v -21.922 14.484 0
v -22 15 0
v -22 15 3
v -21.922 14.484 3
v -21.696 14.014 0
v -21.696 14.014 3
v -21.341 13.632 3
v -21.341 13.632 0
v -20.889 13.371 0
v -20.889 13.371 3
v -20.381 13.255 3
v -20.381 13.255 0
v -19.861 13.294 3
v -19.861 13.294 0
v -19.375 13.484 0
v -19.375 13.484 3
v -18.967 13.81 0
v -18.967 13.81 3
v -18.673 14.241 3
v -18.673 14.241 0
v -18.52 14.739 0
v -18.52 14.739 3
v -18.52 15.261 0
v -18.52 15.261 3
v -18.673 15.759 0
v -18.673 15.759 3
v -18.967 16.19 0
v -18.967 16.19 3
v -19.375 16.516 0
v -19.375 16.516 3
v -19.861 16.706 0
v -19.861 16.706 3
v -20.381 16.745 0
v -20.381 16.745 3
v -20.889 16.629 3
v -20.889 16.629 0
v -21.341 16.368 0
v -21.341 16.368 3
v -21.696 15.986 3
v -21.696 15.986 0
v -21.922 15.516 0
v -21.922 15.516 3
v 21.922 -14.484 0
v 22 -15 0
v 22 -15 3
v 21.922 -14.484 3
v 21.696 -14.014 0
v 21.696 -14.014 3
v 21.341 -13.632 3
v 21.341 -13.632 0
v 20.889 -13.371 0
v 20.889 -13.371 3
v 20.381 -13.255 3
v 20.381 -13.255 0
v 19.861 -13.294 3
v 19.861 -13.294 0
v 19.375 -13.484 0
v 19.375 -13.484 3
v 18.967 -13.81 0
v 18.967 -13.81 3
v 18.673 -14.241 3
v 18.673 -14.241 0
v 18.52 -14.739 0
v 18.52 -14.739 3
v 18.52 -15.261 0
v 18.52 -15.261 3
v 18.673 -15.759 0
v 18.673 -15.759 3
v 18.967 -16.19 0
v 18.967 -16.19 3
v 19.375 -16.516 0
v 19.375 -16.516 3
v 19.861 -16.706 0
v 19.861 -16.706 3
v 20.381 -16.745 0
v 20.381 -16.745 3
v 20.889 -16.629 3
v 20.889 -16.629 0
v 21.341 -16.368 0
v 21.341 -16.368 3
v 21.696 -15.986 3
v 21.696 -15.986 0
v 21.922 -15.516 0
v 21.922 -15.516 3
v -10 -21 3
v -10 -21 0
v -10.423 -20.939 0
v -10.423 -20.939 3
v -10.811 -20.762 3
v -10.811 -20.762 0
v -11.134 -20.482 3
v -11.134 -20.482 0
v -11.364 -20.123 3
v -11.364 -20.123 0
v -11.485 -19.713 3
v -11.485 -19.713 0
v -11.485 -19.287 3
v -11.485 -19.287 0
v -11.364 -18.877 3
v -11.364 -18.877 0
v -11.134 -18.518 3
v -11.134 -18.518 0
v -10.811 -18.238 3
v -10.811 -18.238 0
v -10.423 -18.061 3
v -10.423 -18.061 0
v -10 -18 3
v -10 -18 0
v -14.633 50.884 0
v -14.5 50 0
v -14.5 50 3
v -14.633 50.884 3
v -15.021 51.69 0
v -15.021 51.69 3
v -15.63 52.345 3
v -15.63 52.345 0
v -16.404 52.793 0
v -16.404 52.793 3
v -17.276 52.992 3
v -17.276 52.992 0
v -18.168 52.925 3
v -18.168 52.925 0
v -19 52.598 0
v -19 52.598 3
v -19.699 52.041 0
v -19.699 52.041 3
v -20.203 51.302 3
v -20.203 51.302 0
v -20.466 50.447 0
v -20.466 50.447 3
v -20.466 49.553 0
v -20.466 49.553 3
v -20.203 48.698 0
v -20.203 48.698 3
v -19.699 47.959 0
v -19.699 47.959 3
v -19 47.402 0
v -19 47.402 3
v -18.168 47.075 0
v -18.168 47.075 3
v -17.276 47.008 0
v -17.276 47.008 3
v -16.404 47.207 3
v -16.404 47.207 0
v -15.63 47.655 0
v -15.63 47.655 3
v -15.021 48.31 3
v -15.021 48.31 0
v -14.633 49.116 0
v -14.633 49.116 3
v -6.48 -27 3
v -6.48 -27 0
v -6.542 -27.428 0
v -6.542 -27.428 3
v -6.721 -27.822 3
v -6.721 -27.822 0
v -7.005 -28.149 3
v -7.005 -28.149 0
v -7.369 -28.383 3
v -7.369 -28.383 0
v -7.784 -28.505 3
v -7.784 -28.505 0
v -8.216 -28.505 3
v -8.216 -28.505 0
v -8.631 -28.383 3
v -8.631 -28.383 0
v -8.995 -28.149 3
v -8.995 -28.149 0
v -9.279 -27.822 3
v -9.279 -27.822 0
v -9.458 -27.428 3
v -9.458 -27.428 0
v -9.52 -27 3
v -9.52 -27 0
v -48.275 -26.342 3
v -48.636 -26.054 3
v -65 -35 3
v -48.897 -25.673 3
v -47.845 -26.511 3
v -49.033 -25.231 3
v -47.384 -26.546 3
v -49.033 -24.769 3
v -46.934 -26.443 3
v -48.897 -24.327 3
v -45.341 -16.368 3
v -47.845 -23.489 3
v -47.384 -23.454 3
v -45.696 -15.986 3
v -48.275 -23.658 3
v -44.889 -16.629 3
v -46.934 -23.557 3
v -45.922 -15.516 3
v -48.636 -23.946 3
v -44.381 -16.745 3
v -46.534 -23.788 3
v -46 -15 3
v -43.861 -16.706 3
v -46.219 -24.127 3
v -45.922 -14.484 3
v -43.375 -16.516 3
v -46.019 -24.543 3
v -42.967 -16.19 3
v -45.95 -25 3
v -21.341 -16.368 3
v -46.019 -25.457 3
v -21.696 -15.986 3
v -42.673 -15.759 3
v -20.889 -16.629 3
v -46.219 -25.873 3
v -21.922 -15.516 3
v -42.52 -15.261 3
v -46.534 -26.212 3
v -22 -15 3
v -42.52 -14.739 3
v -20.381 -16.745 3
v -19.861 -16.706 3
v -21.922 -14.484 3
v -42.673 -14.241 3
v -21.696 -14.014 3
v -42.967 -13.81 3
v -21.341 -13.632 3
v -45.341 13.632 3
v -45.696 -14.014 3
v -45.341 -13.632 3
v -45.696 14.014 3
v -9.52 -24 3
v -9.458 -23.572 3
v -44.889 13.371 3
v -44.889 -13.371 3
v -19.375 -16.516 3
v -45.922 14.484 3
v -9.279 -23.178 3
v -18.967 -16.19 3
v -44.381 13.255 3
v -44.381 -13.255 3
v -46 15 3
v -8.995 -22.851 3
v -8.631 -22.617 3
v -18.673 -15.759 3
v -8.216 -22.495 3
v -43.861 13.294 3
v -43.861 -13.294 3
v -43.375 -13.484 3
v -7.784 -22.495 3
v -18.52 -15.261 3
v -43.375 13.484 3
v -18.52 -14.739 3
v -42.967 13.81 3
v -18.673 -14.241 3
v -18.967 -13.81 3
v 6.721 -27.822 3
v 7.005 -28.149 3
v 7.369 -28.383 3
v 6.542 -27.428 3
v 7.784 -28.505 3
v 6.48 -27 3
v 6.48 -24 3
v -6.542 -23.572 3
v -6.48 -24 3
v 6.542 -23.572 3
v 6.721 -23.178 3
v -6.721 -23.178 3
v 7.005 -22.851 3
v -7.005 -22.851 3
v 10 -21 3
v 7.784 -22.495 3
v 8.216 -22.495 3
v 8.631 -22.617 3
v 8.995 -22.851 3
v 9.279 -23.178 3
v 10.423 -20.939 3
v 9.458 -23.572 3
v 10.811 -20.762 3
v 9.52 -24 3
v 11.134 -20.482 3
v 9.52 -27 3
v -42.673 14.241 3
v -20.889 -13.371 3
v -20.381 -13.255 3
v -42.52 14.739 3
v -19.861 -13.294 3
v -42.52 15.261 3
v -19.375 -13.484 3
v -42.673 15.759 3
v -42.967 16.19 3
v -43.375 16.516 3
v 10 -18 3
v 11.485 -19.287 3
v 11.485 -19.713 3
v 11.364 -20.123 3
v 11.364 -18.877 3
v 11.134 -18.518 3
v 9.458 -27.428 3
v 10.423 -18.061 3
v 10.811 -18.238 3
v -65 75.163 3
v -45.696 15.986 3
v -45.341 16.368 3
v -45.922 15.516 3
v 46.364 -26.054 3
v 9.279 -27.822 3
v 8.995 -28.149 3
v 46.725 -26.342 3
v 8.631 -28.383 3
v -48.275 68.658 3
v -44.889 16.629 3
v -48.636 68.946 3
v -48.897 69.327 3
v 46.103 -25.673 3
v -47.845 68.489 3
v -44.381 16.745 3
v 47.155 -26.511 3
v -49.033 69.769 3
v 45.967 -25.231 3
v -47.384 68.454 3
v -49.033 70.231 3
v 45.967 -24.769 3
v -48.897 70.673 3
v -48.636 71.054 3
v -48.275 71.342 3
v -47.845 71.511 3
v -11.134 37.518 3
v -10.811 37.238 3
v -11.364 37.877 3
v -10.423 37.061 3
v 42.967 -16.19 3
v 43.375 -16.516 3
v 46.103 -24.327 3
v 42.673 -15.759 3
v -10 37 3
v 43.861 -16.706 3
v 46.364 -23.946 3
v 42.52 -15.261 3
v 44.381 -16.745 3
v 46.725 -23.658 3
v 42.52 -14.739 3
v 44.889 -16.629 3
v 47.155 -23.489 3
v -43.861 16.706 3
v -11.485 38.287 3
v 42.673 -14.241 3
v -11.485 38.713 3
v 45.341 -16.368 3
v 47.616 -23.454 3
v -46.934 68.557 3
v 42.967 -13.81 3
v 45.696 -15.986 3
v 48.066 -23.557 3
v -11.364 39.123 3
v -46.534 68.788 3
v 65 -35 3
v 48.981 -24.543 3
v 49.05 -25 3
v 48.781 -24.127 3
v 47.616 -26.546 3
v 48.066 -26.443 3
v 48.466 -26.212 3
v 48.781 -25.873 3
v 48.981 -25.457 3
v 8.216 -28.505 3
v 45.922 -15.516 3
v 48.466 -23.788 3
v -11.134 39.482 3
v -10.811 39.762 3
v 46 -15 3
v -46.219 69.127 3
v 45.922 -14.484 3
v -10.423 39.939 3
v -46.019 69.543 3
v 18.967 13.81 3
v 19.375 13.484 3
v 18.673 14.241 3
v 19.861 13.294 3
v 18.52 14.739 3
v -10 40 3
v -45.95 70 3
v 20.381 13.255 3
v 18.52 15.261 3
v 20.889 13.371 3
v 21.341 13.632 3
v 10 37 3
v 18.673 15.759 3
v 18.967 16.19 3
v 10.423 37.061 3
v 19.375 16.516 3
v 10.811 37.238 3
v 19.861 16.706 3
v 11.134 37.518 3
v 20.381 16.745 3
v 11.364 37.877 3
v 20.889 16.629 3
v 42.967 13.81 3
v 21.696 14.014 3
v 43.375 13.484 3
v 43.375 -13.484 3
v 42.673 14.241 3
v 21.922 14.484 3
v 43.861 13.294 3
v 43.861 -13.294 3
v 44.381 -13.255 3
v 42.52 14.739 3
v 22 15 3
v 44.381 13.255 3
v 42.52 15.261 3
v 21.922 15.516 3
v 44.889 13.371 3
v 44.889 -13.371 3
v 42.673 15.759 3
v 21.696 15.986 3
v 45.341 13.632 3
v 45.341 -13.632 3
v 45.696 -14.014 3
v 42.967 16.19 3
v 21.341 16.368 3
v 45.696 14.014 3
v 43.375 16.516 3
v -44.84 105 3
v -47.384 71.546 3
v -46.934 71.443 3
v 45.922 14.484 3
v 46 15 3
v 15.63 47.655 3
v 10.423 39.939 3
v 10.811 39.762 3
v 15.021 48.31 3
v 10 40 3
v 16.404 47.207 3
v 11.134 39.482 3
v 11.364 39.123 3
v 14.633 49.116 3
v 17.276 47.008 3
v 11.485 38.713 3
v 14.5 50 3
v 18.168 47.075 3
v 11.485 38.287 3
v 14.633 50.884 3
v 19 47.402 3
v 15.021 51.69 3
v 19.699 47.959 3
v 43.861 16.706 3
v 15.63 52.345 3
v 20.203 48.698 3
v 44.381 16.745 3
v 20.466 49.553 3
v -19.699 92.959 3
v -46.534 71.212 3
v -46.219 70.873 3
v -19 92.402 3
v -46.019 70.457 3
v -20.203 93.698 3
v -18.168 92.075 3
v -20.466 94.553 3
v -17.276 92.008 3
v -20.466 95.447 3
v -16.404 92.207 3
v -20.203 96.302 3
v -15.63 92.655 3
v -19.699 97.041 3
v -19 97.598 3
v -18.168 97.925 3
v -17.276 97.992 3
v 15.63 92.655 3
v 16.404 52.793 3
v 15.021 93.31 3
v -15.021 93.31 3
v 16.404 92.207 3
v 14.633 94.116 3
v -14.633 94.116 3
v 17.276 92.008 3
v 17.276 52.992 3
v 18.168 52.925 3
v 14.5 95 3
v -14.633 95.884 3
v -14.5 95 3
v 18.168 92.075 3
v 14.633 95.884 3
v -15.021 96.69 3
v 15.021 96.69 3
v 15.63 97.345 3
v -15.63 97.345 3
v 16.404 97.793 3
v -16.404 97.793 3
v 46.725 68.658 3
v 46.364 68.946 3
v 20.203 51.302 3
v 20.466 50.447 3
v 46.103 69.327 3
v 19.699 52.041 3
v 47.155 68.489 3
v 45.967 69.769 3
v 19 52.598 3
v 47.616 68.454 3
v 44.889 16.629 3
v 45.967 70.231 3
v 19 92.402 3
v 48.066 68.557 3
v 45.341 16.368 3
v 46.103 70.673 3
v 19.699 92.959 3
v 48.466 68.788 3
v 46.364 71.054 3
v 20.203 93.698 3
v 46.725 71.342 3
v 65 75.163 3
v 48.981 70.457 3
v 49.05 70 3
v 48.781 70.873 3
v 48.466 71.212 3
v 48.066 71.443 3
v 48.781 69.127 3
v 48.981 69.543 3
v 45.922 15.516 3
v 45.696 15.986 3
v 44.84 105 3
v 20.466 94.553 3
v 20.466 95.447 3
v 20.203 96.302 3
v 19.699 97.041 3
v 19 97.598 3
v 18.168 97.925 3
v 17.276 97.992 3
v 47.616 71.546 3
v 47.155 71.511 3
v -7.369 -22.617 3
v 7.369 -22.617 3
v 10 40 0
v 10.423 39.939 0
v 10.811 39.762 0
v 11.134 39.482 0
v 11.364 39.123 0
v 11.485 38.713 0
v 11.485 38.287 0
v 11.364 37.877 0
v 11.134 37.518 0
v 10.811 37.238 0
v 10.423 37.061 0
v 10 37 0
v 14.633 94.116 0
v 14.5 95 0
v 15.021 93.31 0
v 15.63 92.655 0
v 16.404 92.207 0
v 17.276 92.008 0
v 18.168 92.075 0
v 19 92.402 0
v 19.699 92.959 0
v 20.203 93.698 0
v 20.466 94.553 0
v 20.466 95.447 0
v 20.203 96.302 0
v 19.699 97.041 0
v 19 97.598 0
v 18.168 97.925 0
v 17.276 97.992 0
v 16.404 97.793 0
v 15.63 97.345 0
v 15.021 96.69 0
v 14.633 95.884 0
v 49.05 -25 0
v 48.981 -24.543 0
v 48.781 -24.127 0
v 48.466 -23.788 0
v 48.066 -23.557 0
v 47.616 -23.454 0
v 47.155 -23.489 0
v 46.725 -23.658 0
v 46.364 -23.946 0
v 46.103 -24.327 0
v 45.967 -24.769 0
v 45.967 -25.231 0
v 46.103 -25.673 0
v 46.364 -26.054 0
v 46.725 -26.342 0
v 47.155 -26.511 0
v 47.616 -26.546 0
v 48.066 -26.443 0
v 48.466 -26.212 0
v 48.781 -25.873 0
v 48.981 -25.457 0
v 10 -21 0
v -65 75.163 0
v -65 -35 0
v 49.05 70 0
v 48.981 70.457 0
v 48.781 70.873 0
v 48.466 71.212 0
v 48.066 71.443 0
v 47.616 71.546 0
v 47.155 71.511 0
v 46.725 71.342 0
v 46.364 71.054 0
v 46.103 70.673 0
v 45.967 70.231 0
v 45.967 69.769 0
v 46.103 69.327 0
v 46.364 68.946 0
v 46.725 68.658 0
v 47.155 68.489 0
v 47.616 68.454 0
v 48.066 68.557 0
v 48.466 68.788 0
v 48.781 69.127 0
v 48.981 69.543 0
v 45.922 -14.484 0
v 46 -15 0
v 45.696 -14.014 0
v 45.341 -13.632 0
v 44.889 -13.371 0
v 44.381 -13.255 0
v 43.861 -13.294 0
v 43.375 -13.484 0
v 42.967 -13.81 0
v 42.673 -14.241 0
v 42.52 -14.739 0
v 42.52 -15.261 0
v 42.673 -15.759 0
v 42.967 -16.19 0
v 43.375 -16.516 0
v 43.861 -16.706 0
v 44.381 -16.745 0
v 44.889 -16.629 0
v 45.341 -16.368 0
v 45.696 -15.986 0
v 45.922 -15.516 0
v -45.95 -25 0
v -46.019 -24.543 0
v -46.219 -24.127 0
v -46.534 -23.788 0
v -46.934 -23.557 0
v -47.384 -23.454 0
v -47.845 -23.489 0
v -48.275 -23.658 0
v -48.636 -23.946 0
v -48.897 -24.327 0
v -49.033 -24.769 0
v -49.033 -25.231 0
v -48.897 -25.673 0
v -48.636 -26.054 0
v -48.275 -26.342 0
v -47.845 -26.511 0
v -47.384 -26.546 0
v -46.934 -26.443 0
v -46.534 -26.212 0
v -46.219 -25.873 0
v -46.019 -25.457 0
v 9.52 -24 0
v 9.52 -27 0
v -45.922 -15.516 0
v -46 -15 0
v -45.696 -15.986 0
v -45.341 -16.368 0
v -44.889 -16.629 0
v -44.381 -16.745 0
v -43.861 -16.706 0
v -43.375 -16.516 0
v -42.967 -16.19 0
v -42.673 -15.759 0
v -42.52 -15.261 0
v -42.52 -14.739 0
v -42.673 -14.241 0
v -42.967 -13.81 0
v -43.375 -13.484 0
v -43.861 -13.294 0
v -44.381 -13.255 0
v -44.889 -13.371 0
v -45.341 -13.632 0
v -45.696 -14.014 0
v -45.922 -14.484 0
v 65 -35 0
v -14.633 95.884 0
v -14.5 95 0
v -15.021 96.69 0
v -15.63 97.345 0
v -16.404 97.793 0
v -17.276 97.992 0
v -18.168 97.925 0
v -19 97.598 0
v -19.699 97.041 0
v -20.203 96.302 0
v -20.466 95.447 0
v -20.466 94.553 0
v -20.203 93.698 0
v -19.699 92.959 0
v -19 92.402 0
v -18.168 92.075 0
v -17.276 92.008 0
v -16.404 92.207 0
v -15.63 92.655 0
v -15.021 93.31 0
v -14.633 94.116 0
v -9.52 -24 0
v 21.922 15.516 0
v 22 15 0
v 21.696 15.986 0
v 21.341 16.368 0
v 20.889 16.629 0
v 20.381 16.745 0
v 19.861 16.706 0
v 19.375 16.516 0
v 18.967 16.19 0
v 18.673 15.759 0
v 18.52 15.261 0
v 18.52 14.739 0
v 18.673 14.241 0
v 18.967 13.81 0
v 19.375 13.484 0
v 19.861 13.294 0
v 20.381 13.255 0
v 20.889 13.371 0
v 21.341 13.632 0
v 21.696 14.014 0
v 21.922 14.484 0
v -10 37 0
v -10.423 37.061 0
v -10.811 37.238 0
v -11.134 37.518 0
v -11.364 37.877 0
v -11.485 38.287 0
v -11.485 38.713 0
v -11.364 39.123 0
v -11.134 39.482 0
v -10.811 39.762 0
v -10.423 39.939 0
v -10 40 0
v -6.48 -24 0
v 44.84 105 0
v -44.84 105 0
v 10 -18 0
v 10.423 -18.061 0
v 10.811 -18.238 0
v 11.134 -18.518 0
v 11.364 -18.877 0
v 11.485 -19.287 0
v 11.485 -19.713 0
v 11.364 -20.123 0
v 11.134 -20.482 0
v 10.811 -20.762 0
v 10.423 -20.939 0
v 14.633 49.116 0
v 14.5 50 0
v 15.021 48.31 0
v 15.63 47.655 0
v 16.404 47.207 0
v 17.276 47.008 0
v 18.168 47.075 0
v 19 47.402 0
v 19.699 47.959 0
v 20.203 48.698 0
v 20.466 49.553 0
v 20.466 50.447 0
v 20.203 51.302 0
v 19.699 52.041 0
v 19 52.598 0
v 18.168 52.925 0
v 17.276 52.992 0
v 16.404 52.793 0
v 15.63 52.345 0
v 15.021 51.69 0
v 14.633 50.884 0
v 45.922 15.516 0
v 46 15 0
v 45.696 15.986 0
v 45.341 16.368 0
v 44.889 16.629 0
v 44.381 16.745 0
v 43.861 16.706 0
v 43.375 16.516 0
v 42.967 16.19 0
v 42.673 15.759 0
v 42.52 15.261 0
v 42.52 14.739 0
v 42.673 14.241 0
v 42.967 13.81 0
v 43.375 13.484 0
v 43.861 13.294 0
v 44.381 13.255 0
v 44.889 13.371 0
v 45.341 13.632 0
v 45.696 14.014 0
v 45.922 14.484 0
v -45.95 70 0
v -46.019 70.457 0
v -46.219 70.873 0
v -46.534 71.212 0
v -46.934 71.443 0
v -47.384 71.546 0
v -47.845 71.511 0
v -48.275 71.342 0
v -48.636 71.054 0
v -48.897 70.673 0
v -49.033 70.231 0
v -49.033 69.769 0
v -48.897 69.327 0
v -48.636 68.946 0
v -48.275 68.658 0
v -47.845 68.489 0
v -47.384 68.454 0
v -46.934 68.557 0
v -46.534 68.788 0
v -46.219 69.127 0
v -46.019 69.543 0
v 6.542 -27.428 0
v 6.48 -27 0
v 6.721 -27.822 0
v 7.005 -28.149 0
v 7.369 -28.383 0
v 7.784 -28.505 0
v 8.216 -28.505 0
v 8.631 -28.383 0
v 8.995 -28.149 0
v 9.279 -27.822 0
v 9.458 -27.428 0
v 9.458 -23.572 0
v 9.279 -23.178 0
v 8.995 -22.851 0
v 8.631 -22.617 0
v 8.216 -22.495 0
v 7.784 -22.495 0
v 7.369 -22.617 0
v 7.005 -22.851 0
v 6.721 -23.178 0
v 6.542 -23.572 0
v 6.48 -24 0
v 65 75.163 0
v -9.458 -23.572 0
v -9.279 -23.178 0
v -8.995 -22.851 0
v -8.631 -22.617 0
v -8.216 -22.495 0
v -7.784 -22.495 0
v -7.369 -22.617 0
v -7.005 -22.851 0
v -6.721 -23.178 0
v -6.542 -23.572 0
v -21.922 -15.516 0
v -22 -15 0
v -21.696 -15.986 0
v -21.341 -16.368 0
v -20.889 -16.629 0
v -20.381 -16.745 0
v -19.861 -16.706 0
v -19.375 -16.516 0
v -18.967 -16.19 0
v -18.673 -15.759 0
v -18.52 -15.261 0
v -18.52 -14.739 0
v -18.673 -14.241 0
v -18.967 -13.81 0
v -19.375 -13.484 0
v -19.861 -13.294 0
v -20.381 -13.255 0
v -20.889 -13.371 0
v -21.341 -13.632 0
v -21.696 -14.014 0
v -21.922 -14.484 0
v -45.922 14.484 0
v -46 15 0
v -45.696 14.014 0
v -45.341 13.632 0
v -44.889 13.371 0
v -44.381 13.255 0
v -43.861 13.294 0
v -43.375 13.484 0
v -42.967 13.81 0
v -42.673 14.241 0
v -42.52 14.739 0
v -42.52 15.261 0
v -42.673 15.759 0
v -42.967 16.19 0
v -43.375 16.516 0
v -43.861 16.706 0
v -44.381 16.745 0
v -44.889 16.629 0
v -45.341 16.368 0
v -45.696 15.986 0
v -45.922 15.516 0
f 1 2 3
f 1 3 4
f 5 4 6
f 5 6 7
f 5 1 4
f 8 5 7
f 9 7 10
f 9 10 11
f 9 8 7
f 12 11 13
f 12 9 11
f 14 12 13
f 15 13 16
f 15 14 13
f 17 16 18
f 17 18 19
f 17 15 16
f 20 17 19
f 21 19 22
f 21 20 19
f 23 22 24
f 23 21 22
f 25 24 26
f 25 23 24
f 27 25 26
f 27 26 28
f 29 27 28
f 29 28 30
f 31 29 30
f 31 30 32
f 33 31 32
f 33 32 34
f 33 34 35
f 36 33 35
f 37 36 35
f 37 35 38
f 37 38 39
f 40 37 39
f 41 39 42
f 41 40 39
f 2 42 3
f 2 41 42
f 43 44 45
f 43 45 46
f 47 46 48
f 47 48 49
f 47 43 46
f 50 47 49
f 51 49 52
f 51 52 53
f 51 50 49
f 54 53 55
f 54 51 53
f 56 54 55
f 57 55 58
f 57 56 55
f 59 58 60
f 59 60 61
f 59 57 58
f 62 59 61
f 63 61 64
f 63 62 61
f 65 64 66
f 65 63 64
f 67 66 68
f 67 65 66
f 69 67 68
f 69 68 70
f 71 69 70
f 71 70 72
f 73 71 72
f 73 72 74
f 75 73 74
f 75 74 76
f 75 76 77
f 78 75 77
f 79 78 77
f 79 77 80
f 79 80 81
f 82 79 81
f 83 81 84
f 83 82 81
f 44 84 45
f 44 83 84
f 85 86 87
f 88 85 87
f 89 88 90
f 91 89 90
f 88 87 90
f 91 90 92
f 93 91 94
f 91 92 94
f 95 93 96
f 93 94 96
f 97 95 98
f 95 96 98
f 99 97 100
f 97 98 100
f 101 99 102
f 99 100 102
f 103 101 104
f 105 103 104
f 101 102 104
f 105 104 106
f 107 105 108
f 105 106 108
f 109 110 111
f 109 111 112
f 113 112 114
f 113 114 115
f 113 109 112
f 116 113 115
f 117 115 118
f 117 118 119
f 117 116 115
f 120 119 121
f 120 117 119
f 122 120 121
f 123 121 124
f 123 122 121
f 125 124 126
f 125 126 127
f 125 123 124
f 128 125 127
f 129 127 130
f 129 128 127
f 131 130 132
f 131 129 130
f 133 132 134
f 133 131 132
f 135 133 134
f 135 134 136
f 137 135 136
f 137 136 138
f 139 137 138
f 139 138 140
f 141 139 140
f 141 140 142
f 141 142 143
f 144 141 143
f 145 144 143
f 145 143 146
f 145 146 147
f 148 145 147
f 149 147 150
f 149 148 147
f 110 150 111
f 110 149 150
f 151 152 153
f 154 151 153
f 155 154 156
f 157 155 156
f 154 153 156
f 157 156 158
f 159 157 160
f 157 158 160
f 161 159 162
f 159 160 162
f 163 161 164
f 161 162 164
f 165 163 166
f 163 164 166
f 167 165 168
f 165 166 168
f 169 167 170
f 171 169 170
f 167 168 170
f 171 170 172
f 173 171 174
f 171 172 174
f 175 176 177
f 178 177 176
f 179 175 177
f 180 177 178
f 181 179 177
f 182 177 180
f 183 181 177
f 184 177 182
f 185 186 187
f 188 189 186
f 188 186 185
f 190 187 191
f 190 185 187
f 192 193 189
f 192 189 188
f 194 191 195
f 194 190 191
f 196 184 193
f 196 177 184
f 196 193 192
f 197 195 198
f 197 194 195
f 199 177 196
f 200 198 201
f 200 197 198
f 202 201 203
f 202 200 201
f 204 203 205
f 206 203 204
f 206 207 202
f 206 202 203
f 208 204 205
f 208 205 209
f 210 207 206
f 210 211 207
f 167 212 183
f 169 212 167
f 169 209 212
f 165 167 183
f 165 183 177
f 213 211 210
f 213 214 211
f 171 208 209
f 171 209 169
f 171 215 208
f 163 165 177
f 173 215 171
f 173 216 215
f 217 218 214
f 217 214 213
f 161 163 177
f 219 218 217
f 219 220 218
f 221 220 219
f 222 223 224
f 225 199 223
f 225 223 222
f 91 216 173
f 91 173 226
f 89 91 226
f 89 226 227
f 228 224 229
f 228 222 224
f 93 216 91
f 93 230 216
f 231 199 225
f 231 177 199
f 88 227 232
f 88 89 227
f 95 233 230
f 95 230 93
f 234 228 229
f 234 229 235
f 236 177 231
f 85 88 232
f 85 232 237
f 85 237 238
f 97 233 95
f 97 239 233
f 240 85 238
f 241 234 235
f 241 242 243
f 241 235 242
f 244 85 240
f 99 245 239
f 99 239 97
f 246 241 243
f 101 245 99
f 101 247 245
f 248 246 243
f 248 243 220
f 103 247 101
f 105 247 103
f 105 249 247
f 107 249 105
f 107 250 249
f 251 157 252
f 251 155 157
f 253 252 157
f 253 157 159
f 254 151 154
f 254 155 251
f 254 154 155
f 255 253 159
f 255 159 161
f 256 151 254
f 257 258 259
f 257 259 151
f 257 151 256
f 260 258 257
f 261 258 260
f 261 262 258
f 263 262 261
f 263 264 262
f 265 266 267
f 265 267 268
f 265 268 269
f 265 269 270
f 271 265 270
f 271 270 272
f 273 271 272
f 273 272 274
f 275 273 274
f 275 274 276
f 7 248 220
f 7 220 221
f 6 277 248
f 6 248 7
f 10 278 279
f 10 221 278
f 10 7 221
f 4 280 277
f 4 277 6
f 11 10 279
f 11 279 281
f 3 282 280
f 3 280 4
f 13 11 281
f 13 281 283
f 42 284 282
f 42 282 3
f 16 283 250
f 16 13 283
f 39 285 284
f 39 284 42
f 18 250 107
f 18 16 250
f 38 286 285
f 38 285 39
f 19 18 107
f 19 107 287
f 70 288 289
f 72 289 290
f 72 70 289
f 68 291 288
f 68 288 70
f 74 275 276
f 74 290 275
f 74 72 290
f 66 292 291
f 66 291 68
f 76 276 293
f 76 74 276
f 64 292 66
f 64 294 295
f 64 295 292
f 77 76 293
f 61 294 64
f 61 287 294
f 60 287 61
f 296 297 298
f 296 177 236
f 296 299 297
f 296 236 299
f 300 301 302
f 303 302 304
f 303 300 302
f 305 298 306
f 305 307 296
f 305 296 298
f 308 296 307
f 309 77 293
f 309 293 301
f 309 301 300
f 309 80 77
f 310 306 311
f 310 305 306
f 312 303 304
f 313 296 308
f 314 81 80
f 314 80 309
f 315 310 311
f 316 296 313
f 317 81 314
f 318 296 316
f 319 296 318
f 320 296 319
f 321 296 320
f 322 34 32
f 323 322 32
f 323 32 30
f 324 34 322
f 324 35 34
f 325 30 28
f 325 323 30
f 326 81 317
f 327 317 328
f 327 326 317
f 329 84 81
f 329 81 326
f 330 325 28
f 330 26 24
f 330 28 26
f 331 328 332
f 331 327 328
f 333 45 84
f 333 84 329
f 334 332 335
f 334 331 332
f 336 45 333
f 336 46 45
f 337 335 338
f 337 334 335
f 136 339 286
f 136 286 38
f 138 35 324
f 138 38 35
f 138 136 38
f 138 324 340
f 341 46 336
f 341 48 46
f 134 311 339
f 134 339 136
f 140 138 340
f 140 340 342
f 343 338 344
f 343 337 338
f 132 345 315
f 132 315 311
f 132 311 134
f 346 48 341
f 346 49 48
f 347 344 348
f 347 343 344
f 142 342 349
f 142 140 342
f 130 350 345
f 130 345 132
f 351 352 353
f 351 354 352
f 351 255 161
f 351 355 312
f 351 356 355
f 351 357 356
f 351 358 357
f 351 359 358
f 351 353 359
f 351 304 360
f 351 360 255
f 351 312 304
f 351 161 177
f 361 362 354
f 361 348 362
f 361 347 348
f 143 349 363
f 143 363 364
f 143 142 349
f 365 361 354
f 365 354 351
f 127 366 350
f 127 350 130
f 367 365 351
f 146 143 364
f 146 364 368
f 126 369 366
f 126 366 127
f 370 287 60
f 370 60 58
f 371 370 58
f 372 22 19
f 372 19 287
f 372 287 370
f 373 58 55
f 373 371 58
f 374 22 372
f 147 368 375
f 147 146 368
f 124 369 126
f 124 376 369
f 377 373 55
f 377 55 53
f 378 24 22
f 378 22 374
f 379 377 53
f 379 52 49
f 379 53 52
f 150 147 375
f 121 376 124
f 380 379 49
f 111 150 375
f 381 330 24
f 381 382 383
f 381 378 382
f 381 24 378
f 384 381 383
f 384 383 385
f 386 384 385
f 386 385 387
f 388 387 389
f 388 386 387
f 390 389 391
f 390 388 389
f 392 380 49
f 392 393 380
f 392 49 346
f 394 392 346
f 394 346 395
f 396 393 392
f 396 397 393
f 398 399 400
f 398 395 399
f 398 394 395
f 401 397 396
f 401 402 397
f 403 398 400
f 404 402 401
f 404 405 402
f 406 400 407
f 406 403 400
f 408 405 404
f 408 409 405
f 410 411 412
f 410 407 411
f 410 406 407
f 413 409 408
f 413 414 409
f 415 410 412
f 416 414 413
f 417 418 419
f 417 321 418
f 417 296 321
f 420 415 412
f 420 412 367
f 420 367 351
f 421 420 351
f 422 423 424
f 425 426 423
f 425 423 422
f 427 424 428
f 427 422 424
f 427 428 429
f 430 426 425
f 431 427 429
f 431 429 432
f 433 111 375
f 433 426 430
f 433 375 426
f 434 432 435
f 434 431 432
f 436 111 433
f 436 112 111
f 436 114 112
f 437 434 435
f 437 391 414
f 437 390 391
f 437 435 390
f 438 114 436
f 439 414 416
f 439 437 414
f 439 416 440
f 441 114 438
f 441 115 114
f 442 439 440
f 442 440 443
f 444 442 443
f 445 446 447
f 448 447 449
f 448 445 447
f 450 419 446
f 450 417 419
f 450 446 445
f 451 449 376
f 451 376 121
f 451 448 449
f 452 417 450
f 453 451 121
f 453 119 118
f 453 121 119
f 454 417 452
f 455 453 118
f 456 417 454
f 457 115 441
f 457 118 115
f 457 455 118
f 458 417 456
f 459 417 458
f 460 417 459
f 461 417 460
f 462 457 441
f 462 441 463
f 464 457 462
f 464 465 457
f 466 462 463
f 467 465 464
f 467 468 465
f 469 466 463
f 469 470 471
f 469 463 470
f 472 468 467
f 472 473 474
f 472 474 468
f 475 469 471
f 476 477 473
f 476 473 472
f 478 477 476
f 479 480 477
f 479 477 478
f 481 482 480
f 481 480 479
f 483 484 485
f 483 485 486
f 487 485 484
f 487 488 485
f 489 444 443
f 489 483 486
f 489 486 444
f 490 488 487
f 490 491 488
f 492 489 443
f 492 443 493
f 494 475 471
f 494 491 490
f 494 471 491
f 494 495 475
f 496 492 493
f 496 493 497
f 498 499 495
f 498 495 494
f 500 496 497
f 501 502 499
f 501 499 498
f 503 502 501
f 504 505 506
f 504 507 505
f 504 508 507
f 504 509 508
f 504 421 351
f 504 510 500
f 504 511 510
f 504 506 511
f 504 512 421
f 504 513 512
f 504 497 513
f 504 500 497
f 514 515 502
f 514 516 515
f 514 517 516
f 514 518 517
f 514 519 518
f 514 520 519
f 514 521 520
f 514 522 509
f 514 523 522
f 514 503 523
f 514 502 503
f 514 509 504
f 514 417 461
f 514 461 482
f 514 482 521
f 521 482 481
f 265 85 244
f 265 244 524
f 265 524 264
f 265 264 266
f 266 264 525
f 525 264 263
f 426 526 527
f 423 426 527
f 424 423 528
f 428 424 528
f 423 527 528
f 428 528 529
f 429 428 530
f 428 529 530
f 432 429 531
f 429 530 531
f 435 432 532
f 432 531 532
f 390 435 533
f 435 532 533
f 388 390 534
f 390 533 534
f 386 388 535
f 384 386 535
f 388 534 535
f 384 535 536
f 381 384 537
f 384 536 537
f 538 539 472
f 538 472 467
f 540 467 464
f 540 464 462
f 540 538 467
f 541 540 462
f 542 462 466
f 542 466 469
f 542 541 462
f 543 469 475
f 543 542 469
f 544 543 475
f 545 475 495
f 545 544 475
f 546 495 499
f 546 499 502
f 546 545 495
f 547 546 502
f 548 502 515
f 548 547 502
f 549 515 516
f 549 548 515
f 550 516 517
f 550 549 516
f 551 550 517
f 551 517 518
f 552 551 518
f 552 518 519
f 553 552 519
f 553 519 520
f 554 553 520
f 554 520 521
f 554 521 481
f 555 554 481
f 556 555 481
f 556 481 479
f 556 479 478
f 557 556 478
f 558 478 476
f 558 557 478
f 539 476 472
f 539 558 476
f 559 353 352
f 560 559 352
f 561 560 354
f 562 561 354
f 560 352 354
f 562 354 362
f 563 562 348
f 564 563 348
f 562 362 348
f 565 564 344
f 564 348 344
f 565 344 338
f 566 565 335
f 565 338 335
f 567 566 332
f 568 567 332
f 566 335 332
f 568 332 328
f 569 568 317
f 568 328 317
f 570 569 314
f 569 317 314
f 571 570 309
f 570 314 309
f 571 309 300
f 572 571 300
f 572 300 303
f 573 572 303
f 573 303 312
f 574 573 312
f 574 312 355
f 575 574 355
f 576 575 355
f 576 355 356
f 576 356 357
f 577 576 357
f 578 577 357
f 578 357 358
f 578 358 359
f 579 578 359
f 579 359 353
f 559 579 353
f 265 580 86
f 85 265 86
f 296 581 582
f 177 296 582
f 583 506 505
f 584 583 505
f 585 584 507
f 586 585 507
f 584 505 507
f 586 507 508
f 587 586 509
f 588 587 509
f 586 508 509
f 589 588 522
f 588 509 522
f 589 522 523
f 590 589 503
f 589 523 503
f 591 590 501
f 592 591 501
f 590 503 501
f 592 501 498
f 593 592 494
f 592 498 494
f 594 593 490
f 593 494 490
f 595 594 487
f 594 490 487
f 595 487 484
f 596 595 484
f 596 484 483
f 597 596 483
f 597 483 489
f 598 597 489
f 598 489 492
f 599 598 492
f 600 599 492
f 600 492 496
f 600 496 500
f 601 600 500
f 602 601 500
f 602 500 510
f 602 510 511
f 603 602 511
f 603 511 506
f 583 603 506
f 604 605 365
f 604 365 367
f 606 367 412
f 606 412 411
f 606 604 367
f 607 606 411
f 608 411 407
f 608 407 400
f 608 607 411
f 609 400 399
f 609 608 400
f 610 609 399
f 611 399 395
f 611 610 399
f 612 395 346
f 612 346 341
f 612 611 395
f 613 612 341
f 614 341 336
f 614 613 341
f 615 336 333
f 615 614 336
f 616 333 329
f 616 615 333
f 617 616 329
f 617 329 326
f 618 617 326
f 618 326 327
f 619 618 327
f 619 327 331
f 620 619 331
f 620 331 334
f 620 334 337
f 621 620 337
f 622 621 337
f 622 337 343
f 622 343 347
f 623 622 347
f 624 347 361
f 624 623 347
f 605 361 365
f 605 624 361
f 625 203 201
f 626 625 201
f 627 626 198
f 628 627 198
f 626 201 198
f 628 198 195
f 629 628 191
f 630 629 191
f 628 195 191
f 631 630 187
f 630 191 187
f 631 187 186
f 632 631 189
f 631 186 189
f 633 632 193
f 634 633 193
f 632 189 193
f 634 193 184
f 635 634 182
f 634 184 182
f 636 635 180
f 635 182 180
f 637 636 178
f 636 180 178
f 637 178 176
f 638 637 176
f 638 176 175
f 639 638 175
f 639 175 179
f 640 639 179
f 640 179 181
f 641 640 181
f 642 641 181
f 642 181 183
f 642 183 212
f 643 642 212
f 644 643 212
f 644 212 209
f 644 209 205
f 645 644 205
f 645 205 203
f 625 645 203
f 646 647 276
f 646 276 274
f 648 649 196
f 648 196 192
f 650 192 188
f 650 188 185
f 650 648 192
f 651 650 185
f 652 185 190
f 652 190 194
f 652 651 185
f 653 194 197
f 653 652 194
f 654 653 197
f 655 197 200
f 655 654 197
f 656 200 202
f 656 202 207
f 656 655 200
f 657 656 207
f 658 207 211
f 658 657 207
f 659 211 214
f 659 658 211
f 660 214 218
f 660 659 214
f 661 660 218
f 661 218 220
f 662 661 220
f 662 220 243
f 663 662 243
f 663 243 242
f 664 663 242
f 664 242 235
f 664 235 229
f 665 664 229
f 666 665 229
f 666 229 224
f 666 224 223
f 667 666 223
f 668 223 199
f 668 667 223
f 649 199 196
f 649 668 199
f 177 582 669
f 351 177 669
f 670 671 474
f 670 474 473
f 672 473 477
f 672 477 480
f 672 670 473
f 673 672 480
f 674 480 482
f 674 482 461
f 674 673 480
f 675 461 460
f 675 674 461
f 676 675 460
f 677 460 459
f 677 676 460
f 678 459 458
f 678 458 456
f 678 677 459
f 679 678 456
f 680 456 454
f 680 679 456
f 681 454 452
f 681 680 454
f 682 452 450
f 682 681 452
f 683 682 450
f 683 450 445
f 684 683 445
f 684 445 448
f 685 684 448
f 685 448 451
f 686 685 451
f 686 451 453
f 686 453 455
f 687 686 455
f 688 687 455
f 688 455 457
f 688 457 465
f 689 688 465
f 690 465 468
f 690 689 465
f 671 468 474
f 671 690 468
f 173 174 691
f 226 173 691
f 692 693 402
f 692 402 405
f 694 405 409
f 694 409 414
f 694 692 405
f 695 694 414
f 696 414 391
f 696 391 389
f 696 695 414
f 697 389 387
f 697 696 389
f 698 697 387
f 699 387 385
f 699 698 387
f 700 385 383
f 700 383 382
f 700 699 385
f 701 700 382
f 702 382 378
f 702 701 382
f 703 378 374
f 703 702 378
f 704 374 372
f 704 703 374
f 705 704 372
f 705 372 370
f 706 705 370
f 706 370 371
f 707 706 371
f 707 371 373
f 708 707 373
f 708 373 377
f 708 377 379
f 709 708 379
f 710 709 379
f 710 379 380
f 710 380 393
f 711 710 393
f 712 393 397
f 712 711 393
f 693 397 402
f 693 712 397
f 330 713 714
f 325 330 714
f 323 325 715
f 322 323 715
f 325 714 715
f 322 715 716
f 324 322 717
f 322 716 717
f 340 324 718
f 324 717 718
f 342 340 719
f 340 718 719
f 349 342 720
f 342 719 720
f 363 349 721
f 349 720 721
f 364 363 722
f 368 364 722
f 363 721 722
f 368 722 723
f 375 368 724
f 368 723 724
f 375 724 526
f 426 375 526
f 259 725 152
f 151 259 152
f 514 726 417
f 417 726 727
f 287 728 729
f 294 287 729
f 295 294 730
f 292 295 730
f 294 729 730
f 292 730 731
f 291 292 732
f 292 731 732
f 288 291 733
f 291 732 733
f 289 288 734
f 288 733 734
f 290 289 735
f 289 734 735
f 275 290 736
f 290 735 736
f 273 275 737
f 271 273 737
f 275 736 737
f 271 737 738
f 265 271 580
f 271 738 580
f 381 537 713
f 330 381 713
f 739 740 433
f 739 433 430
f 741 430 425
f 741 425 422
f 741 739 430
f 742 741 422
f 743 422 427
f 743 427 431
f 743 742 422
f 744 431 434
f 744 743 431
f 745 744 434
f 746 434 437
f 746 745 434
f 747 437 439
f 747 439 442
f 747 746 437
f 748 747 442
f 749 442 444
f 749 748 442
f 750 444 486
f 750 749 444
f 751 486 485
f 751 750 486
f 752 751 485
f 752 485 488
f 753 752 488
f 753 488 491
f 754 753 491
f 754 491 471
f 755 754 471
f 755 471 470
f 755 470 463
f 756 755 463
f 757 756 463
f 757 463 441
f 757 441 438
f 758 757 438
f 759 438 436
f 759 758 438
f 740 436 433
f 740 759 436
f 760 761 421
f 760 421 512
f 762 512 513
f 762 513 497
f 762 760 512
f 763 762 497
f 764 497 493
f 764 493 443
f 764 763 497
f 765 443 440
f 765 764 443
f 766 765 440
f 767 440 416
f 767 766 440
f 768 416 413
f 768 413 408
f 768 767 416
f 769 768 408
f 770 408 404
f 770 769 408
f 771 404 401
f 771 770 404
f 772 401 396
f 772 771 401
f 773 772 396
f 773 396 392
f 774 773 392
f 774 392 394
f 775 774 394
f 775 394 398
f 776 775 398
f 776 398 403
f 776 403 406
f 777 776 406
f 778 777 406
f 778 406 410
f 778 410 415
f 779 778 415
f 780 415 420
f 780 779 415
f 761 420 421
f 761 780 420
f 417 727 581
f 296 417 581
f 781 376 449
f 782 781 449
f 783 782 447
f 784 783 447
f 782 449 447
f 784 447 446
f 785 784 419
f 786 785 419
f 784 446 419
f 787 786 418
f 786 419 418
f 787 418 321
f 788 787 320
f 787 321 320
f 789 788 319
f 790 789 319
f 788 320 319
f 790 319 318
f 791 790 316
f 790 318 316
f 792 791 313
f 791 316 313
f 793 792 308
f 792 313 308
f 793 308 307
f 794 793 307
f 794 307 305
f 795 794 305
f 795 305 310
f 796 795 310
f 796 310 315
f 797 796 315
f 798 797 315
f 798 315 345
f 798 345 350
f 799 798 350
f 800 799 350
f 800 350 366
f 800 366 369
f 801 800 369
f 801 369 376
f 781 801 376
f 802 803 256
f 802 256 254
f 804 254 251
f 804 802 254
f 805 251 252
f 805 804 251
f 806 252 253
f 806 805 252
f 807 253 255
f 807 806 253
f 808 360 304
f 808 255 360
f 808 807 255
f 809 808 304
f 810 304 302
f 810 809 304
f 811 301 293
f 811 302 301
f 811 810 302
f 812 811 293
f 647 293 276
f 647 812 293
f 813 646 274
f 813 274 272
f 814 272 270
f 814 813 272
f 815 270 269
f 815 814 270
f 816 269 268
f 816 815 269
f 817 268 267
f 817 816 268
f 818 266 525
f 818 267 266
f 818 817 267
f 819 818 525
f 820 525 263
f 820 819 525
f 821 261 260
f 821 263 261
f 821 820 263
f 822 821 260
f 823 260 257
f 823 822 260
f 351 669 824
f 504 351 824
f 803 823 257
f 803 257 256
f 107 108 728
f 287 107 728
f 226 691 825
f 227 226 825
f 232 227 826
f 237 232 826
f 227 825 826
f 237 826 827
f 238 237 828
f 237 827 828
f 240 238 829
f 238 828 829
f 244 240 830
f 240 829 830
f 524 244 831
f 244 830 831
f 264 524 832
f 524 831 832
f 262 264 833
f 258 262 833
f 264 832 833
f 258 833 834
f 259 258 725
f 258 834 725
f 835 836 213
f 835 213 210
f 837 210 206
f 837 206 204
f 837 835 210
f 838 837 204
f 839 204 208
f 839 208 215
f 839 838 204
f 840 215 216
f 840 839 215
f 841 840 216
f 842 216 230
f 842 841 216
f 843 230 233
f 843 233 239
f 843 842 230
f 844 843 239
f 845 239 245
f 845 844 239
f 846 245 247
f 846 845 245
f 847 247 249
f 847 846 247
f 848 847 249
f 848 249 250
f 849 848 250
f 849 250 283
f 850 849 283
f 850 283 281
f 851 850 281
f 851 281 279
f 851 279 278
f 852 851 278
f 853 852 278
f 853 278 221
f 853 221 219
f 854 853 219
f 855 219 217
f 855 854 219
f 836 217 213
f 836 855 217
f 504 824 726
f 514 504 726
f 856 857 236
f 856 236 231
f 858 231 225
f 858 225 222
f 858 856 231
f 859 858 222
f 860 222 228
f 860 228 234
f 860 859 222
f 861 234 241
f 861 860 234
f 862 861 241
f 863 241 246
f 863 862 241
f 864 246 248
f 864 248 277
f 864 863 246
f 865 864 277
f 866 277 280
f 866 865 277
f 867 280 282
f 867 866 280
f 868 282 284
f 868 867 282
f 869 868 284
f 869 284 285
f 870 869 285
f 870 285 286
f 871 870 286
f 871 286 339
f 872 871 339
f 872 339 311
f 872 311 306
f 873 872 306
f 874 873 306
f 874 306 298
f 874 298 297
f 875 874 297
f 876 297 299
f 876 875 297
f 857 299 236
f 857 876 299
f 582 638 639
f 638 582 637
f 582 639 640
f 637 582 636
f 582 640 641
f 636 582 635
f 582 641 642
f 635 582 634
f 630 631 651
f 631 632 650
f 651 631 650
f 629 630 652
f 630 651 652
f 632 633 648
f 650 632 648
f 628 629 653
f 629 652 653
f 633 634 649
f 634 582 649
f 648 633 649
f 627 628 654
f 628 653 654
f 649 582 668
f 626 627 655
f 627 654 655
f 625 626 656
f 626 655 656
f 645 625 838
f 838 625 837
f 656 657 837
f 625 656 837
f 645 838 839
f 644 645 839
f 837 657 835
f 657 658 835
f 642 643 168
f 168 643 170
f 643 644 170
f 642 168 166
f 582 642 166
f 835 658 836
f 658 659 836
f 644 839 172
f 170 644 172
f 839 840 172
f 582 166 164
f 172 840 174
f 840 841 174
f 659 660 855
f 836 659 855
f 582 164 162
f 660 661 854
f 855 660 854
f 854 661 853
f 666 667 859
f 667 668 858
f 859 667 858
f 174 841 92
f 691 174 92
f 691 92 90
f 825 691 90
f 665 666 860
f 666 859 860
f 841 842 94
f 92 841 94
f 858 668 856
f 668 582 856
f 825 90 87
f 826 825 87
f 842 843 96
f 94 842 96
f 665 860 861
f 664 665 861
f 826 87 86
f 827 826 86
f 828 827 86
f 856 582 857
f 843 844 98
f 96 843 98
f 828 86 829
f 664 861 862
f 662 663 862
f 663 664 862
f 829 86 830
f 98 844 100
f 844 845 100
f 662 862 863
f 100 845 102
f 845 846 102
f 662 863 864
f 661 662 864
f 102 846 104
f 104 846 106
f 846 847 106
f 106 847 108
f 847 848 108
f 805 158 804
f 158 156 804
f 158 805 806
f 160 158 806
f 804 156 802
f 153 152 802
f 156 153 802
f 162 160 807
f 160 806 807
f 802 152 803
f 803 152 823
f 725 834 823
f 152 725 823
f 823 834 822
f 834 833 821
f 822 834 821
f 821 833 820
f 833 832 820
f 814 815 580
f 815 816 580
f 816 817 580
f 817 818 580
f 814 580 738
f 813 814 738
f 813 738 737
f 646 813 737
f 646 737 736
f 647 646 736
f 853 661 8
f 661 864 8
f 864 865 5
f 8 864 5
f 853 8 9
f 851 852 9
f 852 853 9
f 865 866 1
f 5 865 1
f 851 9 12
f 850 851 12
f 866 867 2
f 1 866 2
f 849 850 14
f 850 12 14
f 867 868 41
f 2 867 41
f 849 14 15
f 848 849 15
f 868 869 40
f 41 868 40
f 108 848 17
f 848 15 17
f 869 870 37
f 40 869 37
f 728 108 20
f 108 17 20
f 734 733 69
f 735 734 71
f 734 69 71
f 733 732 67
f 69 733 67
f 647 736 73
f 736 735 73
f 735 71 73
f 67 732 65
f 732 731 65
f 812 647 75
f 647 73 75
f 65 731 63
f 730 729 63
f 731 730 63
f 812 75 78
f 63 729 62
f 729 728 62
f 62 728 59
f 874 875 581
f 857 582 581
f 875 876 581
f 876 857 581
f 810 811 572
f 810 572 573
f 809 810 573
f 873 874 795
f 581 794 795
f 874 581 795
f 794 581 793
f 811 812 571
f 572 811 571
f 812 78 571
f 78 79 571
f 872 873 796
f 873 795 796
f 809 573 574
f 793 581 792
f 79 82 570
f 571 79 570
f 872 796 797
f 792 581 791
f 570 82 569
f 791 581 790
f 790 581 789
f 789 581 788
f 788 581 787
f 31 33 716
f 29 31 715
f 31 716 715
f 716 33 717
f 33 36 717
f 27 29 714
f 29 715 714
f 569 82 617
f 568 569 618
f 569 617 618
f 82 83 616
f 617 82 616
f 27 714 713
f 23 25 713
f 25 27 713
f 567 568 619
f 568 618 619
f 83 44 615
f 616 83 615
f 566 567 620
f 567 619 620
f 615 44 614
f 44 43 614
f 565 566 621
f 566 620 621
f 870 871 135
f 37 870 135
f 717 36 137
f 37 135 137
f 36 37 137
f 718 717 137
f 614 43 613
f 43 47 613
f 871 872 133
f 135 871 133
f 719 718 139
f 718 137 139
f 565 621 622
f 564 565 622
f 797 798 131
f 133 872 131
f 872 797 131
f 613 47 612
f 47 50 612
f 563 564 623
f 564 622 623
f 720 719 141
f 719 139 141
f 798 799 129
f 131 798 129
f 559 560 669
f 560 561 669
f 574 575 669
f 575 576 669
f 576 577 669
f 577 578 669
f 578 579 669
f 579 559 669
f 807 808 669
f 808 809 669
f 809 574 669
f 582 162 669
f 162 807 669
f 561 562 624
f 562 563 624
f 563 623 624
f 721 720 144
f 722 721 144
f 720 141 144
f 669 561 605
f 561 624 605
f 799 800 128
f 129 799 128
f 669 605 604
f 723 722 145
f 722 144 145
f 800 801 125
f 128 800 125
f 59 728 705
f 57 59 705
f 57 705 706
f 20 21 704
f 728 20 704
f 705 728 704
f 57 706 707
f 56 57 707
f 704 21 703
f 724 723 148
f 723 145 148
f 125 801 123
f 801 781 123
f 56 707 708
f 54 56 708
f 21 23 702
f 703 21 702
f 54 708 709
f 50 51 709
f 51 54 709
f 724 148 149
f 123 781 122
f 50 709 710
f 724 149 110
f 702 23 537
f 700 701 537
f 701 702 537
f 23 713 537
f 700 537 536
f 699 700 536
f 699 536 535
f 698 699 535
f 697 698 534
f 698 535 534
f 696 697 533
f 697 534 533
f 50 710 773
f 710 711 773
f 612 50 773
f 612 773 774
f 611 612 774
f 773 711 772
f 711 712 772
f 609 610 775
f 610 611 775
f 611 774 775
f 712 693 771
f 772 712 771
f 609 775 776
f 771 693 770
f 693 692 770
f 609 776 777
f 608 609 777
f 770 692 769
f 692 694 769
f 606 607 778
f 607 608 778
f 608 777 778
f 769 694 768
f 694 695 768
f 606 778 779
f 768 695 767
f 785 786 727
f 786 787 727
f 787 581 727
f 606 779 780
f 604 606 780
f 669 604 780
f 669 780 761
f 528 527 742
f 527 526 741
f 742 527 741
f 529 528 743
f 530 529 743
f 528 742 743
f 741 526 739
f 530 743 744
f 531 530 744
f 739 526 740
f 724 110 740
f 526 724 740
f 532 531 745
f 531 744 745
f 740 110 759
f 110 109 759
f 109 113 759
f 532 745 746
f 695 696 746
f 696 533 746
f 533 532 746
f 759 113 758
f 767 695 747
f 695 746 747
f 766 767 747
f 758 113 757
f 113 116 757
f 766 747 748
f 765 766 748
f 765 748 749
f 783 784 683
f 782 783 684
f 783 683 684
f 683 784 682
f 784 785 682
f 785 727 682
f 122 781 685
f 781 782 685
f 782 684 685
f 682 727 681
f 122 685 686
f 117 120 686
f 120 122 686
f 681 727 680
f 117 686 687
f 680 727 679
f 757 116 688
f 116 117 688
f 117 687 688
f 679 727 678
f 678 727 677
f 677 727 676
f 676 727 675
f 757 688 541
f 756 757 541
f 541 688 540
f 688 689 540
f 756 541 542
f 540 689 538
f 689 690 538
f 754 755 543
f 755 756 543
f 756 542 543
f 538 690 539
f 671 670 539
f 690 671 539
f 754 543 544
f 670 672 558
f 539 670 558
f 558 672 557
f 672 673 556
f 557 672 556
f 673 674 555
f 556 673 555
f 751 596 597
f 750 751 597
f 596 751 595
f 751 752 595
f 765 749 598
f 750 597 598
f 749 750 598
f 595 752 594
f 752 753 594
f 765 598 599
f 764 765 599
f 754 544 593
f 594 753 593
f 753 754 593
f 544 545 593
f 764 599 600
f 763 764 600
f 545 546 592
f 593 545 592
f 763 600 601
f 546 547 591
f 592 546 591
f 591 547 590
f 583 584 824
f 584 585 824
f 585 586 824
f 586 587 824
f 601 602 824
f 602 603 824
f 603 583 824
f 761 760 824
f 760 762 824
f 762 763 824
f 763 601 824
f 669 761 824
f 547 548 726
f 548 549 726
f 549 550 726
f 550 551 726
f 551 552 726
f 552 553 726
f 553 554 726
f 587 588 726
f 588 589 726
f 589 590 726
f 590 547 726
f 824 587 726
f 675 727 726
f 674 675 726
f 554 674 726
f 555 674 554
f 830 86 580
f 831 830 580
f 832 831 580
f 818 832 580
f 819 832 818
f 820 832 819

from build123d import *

# Parameters (mm, degrees)
SKETCH_1_R          = 1.75
SKETCH_1_R_2        = 3
EXTRUDE_1_DEPTH     = 3
CUT_EXTRUDE_2_DEPTH = 10
SKETCH_5_R          = 1.55
CUT_EXTRUDE_3_DEPTH = 10


with BuildPart() as part:
    # 草图1 → 凸台-拉伸1 (new body)
    with BuildSketch(Plane.XY):
        Polygon((65, -25), (65, 75.163369284), (44.840227583, 105), (-44.840227583, 105), (-65, 75.163369284), (-65, -25), (-65, -35), (65, -35), align=None)
        with Locations((44.25, -15)):
            Circle(SKETCH_1_R, mode=Mode.SUBTRACT)
        with Locations((20.25, -15)):
            Circle(SKETCH_1_R, mode=Mode.SUBTRACT)
        with Locations((20.25, 15)):
            Circle(SKETCH_1_R, mode=Mode.SUBTRACT)
        with Locations((44.25, 15)):
            Circle(SKETCH_1_R, mode=Mode.SUBTRACT)
        with Locations(Location((-44.25, 15, 0), (0, 0, 180))):
            Circle(SKETCH_1_R, mode=Mode.SUBTRACT)
        with Locations(Location((-20.25, 15, 0), (0, 0, 180))):
            Circle(SKETCH_1_R, mode=Mode.SUBTRACT)
        with Locations(Location((-20.25, -15, 0), (0, 0, 180))):
            Circle(SKETCH_1_R, mode=Mode.SUBTRACT)
        with Locations(Location((-44.25, -15, 0), (0, 0, 180))):
            Circle(SKETCH_1_R, mode=Mode.SUBTRACT)
        with Locations((-17.5, 95)):
            Circle(SKETCH_1_R_2, mode=Mode.SUBTRACT)
        with Locations(Location((17.5, 95, 0), (0, 0, 180))):
            Circle(SKETCH_1_R_2, mode=Mode.SUBTRACT)
        with Locations((-17.5, 50)):
            Circle(SKETCH_1_R_2, mode=Mode.SUBTRACT)
        with Locations(Location((17.5, 50, 0), (0, 0, 180))):
            Circle(SKETCH_1_R_2, mode=Mode.SUBTRACT)
        with BuildLine():
            Line((-10, 40), (10, 40))
            ThreePointArc((10, 40), (11.5, 38.5), (10, 37))
            Line((10, 37), (-10, 37))
            ThreePointArc((-10, 37), (-11.5, 38.5), (-10, 40))
        make_face(mode=Mode.SUBTRACT)
        with BuildLine():
            Line((-10, -18), (10, -18))
            ThreePointArc((10, -18), (11.5, -19.5), (10, -21))
            Line((10, -21), (-10, -21))
            ThreePointArc((-10, -21), (-11.5, -19.5), (-10, -18))
        make_face(mode=Mode.SUBTRACT)
    extrude(amount=EXTRUDE_1_DEPTH)

    # 草图3 → 切除-拉伸2 (cut)
    with BuildSketch(Plane(origin=(0, 0, 0), x_dir=(-1, 0, 0), z_dir=(0, 0, -1))):
        with BuildLine():
            Line((-9.52, -27), (-9.52, -24))
            ThreePointArc((-9.52, -24), (-8, -22.48), (-6.48, -24))
            Line((-6.48, -24), (-6.48, -27))
            ThreePointArc((-6.48, -27), (-8, -28.52), (-9.52, -27))
        make_face()
        with BuildLine():
            Line((9.52, -27), (9.52, -24))
            ThreePointArc((9.52, -24), (8, -22.48), (6.48, -24))
            Line((6.48, -24), (6.48, -27))
            ThreePointArc((6.48, -27), (8, -28.52), (9.52, -27))
        make_face()
    extrude(amount=-CUT_EXTRUDE_2_DEPTH, mode=Mode.SUBTRACT)

    # 草图5 → 切除-拉伸3 (cut)
    with BuildSketch(Plane.XY.offset(3)):
        with Locations((-47.5, 70)):
            Circle(SKETCH_5_R)
        with Locations((47.5, 70)):
            Circle(SKETCH_5_R)
        with Locations((-47.5, -25)):
            Circle(SKETCH_5_R)
        with Locations((47.5, -25)):
            Circle(SKETCH_5_R)
    extrude(amount=-CUT_EXTRUDE_3_DEPTH, mode=Mode.SUBTRACT)


solid = part.part
